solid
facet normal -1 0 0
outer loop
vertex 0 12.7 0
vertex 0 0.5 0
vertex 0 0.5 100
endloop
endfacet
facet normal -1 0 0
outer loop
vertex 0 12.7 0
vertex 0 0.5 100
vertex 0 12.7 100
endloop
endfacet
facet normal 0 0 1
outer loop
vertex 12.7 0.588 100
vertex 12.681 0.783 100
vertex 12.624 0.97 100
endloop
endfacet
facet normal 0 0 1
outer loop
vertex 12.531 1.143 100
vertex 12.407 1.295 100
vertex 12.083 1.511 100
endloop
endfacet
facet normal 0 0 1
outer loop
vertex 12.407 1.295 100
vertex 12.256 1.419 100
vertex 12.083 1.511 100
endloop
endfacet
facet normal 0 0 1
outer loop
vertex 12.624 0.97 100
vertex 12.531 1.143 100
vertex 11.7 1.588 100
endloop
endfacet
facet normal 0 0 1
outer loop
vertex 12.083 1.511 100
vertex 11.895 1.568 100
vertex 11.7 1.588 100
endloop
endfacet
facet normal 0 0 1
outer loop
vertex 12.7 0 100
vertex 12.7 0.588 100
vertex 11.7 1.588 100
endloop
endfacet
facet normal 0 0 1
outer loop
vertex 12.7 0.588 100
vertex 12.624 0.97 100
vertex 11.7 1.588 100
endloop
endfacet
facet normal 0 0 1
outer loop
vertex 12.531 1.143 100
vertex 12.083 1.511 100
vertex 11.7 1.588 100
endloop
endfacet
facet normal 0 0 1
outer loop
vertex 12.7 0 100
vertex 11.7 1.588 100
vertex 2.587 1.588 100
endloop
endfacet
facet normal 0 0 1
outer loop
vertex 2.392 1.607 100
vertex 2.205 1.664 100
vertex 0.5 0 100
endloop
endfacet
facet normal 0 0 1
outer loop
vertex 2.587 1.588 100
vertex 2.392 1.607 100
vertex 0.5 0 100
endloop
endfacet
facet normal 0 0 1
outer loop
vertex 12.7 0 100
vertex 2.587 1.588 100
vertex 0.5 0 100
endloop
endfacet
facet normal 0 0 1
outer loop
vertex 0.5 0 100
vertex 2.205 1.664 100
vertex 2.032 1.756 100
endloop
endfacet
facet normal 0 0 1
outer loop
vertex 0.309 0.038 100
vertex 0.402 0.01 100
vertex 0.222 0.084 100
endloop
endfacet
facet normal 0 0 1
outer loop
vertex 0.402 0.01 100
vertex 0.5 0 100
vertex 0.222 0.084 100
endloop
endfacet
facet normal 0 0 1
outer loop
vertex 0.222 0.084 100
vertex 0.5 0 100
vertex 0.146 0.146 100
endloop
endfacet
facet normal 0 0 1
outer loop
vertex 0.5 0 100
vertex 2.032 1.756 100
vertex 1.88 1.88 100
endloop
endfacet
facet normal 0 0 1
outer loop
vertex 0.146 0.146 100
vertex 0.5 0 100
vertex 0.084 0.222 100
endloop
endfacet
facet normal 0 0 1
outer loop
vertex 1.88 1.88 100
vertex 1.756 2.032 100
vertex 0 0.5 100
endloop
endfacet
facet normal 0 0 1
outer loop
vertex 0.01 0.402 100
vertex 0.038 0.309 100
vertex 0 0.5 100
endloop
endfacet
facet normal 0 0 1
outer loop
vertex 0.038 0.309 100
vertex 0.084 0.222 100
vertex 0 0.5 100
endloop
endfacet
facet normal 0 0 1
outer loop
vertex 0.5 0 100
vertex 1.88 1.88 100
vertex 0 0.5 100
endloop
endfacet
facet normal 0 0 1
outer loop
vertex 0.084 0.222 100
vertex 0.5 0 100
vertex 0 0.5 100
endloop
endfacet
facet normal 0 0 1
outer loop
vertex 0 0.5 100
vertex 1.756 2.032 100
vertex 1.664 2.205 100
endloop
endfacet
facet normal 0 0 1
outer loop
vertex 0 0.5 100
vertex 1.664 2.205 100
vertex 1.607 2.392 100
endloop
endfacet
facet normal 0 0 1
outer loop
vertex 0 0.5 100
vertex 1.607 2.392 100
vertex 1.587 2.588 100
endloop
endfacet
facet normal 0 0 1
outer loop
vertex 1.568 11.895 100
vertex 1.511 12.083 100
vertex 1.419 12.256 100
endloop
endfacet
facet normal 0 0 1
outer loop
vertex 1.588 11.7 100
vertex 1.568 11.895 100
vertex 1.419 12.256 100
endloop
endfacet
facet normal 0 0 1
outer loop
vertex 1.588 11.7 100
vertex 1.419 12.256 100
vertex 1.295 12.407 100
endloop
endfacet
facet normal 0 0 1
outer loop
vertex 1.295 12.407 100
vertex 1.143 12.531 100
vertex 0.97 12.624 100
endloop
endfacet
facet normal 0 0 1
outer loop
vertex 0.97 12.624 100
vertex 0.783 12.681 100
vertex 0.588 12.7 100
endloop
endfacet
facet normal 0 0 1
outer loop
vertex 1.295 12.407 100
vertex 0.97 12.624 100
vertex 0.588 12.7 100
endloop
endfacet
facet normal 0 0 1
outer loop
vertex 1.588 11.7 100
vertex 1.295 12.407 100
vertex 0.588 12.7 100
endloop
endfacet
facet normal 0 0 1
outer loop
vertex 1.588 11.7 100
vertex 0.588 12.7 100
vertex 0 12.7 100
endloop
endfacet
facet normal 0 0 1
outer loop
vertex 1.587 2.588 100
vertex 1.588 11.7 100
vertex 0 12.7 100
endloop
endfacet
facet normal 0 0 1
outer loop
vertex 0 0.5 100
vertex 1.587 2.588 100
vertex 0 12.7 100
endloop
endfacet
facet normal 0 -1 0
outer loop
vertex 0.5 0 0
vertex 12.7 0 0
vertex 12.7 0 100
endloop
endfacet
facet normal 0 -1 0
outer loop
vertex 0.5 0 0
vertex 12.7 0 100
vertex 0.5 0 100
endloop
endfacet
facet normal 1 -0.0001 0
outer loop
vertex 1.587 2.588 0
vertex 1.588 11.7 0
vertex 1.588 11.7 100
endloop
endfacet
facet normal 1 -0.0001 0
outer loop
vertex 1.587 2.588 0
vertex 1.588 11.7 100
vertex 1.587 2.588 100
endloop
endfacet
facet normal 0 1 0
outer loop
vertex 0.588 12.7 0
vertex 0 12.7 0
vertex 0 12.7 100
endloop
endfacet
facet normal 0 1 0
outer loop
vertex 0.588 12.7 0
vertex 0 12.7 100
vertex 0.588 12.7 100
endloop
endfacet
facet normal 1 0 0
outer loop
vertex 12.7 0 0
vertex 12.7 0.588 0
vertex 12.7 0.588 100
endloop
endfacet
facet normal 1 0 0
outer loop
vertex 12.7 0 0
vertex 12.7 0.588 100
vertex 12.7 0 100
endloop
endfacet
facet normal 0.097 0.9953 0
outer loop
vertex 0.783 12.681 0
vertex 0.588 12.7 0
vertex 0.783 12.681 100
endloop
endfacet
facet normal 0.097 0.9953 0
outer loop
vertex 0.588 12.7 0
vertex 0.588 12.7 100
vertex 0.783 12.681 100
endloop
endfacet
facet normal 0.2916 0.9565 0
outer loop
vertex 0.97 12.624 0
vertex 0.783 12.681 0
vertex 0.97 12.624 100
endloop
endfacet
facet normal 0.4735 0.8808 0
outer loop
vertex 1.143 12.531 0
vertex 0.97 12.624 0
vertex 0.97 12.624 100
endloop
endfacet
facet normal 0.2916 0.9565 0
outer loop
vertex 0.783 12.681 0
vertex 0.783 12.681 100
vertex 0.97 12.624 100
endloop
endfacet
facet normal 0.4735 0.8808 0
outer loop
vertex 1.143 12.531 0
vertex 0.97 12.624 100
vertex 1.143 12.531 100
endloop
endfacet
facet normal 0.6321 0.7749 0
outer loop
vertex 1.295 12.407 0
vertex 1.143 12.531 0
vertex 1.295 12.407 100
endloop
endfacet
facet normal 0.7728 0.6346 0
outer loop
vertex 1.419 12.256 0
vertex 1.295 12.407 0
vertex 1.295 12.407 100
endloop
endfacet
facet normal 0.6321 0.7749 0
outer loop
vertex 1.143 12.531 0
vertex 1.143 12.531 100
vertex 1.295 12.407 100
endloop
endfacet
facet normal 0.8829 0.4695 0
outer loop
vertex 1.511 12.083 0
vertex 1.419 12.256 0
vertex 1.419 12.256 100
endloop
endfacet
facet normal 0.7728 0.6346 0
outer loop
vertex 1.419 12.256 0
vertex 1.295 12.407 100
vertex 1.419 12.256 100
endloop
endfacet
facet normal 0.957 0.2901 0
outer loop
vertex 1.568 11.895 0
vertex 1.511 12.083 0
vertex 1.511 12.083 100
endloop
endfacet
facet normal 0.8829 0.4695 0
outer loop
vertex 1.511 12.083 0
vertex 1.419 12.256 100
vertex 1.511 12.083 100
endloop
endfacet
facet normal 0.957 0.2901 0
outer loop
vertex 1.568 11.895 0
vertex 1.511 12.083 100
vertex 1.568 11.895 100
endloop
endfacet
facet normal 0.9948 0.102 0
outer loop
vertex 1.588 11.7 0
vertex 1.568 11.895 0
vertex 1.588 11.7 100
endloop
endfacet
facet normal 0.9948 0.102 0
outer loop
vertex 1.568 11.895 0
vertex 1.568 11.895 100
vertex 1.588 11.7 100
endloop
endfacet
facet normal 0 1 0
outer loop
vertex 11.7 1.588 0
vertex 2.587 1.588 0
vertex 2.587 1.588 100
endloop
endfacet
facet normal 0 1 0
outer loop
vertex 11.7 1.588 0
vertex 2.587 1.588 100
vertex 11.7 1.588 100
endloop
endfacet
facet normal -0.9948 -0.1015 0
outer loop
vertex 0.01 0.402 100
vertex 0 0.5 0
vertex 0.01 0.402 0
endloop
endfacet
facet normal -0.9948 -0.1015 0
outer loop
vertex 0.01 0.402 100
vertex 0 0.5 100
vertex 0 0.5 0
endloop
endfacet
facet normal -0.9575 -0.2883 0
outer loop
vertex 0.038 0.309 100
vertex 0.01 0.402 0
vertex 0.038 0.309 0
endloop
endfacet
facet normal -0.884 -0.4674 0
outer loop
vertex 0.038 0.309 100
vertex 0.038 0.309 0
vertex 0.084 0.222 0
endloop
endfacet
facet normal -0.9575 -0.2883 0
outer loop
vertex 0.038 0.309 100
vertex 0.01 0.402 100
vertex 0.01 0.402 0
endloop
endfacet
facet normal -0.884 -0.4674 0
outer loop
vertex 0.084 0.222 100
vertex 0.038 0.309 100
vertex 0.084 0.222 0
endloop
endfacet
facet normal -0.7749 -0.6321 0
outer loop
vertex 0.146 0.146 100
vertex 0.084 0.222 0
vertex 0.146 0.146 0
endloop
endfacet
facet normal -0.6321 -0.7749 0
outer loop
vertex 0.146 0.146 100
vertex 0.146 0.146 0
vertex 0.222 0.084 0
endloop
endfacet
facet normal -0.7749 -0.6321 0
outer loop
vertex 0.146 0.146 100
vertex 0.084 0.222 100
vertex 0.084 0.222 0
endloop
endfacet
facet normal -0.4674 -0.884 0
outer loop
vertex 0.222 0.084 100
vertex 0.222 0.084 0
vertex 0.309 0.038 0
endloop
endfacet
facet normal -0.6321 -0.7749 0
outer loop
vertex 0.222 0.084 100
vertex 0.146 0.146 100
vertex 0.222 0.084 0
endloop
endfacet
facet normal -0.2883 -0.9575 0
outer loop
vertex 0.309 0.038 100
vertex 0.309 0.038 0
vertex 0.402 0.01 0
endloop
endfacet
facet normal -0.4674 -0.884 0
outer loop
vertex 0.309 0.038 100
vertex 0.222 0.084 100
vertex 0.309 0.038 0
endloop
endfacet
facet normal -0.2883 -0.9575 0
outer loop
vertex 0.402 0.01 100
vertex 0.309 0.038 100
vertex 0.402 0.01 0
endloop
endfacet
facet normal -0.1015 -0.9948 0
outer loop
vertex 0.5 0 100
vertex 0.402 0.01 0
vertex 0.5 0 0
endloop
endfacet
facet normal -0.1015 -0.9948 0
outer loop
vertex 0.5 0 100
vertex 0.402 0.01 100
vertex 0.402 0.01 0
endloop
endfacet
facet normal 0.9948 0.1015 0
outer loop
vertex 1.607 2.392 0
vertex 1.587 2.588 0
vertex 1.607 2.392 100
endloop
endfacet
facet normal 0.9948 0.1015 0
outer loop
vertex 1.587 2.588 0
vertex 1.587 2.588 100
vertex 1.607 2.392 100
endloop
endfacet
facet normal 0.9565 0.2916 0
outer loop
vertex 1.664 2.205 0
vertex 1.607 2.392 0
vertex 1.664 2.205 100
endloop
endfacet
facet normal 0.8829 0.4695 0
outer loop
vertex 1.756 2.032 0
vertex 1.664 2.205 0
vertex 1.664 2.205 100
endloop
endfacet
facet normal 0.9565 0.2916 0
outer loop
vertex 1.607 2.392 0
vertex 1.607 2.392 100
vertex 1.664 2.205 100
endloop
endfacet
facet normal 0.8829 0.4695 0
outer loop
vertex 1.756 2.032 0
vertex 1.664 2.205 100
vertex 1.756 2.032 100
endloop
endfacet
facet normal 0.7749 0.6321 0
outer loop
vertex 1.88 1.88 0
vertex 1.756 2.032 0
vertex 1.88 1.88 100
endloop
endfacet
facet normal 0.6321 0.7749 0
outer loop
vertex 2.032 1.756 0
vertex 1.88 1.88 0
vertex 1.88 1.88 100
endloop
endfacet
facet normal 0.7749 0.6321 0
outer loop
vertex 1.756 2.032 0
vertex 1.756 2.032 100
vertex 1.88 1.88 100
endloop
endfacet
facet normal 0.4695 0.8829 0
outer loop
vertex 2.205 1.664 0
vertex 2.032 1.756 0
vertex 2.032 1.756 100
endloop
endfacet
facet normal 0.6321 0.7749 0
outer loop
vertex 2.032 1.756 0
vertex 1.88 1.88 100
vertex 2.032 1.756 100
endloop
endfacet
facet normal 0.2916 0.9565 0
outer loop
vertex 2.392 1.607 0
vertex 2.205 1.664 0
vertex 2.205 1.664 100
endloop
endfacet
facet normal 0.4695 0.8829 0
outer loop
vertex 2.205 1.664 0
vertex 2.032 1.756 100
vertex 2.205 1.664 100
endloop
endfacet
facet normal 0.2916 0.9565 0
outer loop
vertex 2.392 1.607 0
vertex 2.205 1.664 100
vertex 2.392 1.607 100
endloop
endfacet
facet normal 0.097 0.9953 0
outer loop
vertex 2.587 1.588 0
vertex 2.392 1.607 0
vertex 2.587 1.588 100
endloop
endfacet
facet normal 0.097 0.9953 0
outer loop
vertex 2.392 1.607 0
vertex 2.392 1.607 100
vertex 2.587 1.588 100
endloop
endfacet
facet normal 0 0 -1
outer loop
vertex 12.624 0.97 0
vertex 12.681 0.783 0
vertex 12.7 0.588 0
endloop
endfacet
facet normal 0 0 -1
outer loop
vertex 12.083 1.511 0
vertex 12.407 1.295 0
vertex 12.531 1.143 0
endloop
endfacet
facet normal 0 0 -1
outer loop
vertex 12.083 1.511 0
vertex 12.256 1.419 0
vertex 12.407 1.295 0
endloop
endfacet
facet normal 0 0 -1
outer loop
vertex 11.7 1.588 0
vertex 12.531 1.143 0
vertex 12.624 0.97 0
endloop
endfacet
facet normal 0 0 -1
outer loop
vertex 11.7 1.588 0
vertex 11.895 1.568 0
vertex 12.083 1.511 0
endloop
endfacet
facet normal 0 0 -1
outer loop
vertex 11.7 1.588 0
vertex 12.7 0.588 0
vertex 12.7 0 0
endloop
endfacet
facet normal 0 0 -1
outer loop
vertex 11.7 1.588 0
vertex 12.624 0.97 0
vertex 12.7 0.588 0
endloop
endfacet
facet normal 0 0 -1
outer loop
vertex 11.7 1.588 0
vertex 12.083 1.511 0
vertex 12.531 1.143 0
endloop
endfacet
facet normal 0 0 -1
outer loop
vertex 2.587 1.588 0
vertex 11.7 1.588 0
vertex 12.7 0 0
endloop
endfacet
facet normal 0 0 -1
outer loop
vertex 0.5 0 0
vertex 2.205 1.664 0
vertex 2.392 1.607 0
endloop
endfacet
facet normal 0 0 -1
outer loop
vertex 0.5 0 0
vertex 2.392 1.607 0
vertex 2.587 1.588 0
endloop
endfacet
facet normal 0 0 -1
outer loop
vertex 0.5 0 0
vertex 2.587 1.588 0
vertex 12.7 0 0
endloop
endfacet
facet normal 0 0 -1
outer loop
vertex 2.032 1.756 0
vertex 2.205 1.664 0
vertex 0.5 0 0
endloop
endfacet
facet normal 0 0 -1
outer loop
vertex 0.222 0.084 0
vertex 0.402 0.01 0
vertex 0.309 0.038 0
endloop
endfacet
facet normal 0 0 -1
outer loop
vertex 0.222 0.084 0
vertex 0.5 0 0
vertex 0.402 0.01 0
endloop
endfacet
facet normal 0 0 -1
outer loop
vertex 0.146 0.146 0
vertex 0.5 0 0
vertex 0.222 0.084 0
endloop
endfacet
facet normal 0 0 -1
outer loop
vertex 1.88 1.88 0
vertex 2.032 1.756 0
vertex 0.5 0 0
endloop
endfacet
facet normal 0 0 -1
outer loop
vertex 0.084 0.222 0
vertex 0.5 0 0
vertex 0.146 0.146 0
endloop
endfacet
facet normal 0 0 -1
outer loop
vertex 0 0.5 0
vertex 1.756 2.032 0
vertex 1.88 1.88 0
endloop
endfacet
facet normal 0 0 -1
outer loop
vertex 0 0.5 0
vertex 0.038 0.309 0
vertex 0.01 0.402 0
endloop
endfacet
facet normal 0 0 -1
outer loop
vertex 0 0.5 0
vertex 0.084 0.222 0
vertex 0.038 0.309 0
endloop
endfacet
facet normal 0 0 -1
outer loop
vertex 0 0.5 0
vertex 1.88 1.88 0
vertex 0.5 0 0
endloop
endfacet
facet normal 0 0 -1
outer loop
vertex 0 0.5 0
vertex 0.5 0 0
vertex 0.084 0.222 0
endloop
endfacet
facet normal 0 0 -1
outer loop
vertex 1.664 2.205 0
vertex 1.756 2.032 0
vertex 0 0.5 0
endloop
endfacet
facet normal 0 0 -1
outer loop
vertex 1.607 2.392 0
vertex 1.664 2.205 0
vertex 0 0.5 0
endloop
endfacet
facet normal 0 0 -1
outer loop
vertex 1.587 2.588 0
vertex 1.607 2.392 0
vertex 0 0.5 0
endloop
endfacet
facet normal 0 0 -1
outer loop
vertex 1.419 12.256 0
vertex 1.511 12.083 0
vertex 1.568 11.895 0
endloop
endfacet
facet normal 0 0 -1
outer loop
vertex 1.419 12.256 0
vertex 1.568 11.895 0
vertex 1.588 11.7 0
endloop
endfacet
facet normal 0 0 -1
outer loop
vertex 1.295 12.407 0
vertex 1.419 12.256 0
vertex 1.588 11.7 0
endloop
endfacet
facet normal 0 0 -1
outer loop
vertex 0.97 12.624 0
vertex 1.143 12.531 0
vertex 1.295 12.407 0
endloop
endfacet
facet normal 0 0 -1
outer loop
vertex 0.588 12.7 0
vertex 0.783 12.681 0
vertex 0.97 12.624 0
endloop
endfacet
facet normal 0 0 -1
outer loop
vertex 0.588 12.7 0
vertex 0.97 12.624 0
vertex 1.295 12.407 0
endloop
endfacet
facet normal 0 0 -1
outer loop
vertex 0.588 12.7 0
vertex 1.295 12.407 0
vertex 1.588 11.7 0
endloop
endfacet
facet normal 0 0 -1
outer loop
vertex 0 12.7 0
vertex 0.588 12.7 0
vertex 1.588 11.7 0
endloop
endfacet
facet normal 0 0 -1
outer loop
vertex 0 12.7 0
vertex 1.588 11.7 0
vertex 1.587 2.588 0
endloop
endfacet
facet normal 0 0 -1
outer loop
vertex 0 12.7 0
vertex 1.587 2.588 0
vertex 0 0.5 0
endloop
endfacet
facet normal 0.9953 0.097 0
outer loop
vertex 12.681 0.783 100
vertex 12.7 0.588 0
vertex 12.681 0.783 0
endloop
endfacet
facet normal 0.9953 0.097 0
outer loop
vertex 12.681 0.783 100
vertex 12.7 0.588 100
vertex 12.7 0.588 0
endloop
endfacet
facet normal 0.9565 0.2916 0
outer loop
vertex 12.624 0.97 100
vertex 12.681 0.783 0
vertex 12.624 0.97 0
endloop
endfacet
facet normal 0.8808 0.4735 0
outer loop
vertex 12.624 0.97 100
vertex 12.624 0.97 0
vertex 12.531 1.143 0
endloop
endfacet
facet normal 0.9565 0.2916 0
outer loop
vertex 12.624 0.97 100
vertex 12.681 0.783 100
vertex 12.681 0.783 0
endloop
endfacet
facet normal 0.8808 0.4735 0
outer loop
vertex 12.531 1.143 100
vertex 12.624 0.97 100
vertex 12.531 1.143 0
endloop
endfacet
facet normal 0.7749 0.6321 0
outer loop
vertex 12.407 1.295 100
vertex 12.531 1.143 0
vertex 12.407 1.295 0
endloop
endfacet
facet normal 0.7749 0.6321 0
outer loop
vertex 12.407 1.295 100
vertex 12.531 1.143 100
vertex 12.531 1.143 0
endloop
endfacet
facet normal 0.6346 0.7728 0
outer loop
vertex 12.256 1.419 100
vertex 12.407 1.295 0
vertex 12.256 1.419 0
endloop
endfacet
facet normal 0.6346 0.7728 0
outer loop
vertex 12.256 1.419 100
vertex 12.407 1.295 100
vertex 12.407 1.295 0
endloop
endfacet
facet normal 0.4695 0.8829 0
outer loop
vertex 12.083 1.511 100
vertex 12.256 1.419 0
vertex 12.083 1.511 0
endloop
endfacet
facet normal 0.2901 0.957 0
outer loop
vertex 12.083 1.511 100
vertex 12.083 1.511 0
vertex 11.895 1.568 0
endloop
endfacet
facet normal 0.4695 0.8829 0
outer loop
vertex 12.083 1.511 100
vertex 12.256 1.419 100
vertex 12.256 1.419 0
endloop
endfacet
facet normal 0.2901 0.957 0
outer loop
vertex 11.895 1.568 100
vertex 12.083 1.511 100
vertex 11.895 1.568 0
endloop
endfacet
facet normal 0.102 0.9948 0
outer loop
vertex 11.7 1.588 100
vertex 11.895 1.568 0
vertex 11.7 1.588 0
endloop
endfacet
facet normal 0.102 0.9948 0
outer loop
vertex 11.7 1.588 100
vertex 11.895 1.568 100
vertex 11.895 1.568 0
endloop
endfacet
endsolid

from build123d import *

# Parameters (mm, degrees)
BOSS_EXTRUDE1_DEPTH = 100
FILLET1_R           = 0.5
FILLET2_R           = 1


with BuildPart() as part:
    # Sketch1 → Boss-Extrude1 (new body)
    with BuildSketch(Plane.XY):
        Polygon((0, 0), (0, 12.7), (1.5875, 12.7), (1.5875, 1.5875), (12.7, 1.5875), (12.7, 0), align=None)
    extrude(amount=BOSS_EXTRUDE1_DEPTH)

    # Fillet1
    fillet1_edges = [part.edges().sort_by_distance(p)[0] for p in [
        (0, 0, 50),
    ]]
    fillet(fillet1_edges, radius=FILLET1_R)

    # Fillet2
    fillet2_edges = [part.edges().sort_by_distance(p)[0] for p in [
        (1.5875, 12.7, 50),
        (1.5875, 1.5875, 50),
        (12.7, 1.5875, 50),
    ]]
    fillet(fillet2_edges, radius=FILLET2_R)


solid = part.part
